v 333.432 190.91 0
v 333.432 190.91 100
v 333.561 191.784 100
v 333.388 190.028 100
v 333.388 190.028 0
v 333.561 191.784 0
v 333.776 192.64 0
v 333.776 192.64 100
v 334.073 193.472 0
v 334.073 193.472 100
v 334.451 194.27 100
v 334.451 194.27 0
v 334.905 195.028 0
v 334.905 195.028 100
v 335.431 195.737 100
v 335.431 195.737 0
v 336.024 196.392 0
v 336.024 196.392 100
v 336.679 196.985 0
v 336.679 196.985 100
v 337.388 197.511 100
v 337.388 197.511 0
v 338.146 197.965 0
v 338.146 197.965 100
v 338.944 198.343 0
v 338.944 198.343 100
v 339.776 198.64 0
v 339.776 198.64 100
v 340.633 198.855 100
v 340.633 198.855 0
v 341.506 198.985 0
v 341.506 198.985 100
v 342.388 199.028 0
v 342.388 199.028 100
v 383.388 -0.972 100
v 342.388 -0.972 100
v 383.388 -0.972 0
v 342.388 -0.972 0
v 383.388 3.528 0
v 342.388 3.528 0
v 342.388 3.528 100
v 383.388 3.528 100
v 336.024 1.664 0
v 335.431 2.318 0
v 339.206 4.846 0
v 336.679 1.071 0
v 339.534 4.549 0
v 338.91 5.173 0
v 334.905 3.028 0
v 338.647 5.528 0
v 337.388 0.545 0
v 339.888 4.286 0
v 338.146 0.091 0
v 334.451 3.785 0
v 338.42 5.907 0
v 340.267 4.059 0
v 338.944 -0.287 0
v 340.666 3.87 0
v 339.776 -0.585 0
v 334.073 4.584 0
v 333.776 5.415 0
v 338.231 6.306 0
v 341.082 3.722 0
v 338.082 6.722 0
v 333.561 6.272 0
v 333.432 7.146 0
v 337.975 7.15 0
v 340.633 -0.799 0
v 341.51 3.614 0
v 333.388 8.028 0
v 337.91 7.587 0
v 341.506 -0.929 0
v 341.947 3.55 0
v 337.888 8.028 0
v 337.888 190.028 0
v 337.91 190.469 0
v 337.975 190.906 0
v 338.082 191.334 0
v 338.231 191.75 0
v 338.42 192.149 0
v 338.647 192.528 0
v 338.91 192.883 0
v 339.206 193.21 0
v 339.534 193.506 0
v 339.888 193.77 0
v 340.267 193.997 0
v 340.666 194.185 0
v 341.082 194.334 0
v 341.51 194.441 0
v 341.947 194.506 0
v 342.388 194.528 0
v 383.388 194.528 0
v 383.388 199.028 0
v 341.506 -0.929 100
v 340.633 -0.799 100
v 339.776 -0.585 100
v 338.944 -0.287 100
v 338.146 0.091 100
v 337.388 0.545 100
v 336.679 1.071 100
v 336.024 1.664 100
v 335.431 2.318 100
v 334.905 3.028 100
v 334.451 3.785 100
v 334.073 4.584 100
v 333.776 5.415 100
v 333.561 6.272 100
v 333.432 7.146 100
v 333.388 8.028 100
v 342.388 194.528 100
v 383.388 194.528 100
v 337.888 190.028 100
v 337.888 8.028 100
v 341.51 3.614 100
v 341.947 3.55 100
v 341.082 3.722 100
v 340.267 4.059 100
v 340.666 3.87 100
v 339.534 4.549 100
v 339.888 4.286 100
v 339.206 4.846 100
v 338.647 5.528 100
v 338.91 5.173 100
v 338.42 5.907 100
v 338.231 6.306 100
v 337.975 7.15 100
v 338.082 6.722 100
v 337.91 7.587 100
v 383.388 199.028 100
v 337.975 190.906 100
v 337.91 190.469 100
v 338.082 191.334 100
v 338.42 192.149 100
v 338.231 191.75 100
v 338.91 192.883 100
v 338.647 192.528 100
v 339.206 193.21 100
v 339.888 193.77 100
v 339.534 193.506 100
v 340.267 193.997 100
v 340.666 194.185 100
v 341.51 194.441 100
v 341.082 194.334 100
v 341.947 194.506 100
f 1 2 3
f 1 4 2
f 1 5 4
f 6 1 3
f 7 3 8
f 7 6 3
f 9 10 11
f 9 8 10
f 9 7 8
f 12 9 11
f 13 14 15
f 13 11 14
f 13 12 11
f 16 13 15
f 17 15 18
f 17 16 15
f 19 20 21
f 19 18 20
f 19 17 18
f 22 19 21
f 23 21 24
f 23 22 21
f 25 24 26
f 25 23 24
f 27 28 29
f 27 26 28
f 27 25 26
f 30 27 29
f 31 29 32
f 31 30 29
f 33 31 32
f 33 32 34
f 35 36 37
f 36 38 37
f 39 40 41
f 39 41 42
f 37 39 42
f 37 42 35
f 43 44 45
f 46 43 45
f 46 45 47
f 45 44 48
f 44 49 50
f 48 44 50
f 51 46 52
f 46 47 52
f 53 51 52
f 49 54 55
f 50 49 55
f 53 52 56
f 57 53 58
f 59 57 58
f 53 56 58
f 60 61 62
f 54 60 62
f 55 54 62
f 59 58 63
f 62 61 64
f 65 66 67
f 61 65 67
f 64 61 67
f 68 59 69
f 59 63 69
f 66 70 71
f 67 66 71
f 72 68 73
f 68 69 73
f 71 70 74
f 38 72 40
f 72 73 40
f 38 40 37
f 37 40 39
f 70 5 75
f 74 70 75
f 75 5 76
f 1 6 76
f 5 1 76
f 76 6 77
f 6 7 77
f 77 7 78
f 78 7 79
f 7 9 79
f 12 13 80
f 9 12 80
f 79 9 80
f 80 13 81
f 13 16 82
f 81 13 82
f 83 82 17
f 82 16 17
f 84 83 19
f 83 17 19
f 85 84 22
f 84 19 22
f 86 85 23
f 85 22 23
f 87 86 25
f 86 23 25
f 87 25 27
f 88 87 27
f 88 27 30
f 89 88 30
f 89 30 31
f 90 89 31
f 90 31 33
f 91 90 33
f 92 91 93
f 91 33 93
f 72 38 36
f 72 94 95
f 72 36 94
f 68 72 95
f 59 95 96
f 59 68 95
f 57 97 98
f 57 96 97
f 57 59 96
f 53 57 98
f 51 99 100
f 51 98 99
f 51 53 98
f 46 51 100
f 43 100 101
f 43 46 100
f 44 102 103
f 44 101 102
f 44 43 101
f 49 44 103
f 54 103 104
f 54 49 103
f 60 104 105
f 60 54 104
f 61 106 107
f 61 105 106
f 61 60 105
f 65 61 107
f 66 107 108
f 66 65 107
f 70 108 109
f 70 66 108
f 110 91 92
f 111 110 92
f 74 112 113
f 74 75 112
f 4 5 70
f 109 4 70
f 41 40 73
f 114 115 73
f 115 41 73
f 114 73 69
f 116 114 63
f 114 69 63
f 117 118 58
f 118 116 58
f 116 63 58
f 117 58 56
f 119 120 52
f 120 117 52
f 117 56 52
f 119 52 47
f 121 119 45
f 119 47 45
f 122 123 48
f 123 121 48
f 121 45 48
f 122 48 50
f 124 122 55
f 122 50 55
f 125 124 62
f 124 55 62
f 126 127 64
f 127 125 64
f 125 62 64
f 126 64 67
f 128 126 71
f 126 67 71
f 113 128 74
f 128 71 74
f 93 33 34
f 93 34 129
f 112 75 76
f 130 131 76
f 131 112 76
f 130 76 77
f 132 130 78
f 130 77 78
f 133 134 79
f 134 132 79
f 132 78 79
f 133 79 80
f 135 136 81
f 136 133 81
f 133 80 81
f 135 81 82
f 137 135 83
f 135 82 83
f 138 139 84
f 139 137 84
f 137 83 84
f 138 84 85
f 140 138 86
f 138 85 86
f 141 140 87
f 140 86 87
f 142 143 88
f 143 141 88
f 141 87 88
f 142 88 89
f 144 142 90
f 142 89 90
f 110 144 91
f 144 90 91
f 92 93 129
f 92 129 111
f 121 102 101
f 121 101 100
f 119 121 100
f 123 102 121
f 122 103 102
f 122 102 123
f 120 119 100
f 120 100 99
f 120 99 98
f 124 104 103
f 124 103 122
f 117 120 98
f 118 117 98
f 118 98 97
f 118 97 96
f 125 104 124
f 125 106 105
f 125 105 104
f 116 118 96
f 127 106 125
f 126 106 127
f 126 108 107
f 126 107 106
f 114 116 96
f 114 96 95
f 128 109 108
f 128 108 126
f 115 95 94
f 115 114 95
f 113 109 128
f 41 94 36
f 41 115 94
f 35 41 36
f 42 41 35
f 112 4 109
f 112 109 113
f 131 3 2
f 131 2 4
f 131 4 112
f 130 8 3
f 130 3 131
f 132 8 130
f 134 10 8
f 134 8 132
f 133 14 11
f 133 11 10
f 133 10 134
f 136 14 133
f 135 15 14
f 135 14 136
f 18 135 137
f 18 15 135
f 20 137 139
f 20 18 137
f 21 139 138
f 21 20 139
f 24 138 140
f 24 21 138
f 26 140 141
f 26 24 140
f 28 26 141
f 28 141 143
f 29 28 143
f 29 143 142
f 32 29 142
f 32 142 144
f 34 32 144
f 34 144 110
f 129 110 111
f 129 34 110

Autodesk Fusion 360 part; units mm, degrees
sketch "スケッチ1" plane through (0, 0, 0) normal (0, 0, 1) x (1, 0, 0)
  line L0 (333.3884, 190.0279) -> (333.3884, 8.0279)
  line L1 (337.8884, 190.0279) -> (337.8884, 8.0279)
  line L2 (342.3884, 3.5279) -> (383.3884, 3.5279)
  line L3 (342.3884, -0.9721) -> (383.3884, -0.9721)
  arc A0 (337.8884, 8.0279) -> (342.3884, 3.5279) centre (342.3884, 8.0279) ccw
  arc A1 (333.3884, 8.0279) -> (342.3884, -0.9721) centre (342.3884, 8.0279) ccw
  line L4 (383.3884, 3.5279) -> (383.3884, -0.9721)
  line L5 (342.3884, 199.0279) -> (383.3884, 199.0279)
  line L6 (342.3884, 194.5279) -> (383.3884, 194.5279)
  arc A2 (342.3884, 194.5279) -> (337.8884, 190.0279) centre (342.3884, 190.0279) ccw
  arc A3 (342.3884, 199.0279) -> (333.3884, 190.0279) centre (342.3884, 190.0279) ccw
  line L7 (383.3884, 199.0279) -> (383.3884, 194.5279)
  point P0 (333.3884, 199.0279)
extrude "押し出し1" add sketch "スケッチ1" along normal blind 100
